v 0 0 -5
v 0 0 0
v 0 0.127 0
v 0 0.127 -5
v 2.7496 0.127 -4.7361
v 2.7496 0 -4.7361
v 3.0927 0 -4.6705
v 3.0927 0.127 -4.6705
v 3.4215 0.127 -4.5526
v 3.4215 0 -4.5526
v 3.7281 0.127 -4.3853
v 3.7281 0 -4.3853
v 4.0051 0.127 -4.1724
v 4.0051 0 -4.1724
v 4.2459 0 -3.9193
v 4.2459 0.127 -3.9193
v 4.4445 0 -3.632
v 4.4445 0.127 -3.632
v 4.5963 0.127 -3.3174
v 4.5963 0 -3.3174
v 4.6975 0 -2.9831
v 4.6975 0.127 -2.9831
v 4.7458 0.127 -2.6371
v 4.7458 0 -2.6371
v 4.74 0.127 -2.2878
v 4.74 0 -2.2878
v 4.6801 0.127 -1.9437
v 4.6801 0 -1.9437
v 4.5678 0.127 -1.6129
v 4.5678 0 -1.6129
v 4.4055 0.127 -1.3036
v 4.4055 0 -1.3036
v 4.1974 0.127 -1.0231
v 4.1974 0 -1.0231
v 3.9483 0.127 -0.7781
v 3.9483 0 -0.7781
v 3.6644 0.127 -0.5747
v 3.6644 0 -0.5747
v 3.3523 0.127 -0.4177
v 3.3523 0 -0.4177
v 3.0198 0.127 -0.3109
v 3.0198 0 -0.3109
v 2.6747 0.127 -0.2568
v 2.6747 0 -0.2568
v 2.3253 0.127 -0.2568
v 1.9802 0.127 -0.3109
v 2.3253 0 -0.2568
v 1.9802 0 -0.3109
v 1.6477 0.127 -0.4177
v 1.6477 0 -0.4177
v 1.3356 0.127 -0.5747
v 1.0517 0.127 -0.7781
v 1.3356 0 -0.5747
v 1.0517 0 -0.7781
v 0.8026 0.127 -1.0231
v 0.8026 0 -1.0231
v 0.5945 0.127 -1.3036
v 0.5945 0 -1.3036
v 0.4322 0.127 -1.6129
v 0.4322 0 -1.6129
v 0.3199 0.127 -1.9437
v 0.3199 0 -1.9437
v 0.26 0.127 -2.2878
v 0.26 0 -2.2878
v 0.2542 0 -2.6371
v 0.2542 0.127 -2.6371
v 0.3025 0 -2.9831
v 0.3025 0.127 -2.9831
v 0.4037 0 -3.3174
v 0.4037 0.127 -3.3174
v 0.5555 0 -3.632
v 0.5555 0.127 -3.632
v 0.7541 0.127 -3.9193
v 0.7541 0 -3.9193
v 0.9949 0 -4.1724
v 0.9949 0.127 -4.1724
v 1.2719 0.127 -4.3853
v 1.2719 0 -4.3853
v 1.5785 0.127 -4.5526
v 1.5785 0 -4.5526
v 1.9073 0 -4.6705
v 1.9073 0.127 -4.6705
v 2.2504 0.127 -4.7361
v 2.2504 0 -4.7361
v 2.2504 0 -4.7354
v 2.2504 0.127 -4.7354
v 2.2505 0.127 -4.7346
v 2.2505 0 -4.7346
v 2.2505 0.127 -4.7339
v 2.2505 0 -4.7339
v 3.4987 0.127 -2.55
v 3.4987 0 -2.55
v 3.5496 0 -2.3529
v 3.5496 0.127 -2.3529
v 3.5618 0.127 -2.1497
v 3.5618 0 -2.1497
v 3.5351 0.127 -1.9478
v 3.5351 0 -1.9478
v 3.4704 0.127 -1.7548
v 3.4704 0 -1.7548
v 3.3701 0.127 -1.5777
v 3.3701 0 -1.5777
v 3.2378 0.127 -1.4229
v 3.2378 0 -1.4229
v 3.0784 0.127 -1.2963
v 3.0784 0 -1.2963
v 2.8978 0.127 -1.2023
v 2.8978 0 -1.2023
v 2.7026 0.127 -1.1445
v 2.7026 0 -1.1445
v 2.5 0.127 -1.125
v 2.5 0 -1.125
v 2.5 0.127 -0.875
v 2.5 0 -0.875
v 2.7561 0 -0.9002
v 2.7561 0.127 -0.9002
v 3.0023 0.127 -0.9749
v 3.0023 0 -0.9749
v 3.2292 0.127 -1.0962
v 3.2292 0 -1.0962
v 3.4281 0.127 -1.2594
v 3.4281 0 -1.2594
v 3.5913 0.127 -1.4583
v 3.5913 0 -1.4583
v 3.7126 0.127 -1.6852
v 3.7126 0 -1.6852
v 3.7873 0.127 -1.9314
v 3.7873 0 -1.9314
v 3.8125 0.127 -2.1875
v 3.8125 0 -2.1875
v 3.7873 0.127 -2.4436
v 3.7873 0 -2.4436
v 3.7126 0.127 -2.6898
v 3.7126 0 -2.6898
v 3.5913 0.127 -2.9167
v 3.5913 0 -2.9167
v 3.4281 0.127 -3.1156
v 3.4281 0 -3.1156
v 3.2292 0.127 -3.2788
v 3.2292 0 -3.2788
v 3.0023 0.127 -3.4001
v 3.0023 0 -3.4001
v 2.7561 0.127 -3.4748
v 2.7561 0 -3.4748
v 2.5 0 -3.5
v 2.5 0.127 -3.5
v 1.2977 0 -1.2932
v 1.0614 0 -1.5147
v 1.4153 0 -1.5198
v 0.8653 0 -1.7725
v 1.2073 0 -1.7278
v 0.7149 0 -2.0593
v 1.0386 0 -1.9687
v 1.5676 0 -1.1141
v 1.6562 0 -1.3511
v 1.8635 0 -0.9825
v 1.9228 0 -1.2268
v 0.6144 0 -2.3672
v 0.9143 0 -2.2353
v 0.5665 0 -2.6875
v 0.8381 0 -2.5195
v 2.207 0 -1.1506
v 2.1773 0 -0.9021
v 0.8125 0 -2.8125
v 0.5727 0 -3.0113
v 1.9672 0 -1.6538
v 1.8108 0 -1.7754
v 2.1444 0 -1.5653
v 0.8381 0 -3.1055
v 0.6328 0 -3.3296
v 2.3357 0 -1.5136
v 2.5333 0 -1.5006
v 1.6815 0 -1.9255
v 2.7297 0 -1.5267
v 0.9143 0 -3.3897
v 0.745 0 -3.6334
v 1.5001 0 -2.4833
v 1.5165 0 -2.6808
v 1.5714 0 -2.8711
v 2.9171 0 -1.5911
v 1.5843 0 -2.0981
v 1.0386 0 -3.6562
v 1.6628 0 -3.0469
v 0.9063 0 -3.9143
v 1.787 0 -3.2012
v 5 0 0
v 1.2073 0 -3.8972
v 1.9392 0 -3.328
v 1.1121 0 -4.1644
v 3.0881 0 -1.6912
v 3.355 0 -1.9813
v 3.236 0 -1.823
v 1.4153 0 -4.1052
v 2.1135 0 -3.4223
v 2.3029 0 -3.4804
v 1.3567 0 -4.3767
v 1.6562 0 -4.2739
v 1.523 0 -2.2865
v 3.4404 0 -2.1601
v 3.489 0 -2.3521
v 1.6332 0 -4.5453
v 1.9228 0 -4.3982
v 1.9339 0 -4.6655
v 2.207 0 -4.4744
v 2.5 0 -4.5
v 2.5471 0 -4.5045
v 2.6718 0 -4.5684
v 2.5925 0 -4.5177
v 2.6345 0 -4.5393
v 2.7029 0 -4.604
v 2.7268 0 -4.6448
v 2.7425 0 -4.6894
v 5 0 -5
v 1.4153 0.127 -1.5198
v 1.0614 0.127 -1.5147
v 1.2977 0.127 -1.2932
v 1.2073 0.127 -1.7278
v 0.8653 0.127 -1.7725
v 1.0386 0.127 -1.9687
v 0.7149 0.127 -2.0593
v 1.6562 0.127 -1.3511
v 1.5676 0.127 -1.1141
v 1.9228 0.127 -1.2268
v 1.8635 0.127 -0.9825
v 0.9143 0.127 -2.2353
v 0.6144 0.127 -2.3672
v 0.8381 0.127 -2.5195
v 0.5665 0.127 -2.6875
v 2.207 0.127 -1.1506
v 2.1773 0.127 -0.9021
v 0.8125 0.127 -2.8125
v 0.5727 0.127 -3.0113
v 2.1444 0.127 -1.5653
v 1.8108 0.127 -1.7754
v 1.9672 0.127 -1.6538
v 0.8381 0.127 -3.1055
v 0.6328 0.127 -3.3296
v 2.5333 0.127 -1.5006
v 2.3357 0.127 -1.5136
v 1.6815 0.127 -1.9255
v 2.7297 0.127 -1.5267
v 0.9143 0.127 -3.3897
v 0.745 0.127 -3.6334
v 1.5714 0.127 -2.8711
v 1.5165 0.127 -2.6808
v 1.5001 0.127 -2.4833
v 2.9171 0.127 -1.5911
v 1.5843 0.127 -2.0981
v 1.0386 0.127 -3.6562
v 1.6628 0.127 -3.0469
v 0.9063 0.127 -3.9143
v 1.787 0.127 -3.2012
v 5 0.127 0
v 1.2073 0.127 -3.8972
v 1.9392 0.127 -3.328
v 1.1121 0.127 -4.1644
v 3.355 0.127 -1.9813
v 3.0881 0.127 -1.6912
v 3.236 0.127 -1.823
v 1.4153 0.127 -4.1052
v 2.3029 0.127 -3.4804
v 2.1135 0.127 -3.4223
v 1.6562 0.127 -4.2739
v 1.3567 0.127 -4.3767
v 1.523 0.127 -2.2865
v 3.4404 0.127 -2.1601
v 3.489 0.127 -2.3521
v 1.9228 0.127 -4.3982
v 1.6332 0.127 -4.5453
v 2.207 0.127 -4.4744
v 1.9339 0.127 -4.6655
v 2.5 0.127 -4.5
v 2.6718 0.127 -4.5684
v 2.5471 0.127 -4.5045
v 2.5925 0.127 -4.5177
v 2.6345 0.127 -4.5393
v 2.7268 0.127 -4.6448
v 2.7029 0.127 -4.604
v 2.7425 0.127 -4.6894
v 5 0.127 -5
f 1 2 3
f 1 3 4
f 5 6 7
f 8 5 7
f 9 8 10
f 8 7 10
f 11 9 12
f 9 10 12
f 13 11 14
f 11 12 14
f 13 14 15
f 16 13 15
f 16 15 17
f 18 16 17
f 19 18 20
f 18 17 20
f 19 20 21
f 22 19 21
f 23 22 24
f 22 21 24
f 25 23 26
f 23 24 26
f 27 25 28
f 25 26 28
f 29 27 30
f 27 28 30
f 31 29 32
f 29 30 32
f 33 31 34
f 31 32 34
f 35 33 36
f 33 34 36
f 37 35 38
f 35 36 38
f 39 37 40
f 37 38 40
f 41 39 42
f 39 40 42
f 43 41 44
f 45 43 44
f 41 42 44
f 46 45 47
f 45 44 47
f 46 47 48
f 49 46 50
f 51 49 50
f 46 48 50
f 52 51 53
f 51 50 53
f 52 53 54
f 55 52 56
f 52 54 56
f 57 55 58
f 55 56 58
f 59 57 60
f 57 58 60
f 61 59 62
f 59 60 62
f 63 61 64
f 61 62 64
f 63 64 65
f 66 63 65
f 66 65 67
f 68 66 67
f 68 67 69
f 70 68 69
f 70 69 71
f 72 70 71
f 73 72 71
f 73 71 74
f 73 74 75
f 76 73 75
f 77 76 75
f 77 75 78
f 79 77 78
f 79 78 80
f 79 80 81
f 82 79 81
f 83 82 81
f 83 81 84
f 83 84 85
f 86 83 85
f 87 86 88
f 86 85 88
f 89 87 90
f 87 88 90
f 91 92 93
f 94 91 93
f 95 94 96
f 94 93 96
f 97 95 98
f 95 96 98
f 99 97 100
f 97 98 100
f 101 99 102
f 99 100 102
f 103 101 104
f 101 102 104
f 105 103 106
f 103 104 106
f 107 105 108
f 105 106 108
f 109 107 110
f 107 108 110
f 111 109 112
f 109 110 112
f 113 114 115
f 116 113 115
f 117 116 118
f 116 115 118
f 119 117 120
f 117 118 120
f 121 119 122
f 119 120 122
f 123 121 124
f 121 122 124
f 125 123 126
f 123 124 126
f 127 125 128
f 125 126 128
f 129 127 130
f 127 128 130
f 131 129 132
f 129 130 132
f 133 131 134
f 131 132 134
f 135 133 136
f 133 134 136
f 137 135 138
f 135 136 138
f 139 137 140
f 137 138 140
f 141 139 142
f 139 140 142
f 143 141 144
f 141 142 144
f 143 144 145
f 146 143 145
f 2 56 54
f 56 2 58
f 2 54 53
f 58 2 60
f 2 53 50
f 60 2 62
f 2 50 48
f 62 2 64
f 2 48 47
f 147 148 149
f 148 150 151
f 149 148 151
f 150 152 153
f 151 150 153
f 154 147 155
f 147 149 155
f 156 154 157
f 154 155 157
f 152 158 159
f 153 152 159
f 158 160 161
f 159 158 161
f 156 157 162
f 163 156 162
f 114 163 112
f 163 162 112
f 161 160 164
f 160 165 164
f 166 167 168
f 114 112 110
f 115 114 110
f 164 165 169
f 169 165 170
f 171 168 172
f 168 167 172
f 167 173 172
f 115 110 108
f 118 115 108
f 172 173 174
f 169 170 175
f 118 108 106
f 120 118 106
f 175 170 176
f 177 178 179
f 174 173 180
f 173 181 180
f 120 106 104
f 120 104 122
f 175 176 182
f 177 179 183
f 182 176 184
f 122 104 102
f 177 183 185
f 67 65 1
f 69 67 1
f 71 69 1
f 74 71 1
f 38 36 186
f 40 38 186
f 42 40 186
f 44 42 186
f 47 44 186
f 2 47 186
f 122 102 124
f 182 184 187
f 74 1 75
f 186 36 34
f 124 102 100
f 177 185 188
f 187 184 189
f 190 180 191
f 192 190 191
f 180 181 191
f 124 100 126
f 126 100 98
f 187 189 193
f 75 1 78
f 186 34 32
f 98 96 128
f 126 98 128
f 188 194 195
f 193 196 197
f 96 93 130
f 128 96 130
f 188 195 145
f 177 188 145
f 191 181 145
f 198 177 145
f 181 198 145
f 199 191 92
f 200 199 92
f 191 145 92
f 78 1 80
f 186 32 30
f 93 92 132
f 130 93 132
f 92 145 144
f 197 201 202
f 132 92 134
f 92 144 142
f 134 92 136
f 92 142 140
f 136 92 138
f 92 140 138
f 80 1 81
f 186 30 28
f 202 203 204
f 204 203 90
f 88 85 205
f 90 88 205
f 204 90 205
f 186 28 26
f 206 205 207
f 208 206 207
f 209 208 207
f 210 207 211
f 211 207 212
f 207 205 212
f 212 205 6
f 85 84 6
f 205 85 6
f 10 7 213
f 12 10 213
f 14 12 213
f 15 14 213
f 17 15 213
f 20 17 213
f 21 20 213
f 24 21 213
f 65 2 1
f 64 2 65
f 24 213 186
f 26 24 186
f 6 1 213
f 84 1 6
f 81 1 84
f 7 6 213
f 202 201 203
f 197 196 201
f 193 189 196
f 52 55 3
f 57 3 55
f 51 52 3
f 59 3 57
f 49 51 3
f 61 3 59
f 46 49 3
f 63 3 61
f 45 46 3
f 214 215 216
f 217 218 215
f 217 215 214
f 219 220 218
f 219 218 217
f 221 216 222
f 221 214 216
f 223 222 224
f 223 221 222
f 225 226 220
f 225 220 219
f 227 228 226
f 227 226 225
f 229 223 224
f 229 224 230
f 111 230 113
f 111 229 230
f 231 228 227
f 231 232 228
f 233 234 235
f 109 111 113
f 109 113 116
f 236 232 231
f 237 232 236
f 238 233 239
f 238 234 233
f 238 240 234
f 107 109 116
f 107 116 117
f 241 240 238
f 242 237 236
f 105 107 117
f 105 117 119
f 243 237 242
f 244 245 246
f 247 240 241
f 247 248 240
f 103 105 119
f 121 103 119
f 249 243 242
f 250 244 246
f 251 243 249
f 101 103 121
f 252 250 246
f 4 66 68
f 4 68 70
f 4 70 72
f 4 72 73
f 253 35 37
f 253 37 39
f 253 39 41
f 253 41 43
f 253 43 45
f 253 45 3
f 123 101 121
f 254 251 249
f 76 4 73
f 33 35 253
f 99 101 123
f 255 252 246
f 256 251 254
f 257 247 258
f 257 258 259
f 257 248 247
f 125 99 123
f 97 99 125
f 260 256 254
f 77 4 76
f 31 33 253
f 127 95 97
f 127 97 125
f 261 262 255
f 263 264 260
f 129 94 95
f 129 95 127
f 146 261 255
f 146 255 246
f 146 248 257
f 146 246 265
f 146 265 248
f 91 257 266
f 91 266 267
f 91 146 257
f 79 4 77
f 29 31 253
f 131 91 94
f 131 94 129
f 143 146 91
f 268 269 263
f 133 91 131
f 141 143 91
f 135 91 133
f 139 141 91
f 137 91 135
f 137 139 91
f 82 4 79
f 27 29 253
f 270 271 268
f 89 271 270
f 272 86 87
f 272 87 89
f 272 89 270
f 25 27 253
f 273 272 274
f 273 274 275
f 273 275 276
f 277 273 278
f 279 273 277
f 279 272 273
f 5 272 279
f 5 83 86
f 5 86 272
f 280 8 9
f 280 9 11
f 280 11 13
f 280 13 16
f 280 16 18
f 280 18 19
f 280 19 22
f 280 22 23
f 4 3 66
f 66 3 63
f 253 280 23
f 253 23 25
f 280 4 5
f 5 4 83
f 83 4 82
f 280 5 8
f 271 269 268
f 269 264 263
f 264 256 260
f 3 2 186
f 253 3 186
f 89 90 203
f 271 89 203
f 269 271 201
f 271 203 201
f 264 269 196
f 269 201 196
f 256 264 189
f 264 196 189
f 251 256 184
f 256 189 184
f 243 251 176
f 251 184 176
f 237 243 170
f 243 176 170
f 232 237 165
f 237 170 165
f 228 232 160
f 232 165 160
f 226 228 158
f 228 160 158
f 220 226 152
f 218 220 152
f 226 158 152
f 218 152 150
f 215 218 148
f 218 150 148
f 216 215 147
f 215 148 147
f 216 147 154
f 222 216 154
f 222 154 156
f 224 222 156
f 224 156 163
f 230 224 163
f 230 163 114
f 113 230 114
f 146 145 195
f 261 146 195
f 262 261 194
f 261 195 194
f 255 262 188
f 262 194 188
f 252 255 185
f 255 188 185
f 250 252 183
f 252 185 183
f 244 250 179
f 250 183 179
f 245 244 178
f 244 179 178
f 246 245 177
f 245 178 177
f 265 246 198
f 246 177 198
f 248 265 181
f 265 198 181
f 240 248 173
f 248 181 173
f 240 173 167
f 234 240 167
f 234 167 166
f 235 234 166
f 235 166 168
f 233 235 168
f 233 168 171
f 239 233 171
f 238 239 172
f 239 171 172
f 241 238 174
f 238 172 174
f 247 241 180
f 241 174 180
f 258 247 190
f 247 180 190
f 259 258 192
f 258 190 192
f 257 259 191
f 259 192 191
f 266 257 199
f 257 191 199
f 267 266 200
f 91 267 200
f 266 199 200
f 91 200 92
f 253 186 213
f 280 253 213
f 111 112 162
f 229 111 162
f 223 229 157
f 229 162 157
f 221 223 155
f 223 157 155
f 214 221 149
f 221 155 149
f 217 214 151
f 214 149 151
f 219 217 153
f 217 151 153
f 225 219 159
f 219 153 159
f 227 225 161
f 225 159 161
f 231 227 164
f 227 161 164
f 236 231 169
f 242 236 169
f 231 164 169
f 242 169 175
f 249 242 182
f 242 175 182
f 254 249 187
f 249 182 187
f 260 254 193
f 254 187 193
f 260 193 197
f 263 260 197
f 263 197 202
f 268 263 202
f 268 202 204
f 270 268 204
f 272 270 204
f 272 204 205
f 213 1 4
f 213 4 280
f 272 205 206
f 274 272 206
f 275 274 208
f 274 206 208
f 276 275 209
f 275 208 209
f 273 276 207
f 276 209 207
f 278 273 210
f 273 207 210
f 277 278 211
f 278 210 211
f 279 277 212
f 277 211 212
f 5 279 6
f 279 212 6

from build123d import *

# Parameters (mm, degrees)
SKETCH1_W           = 5
SKETCH1_H           = 5
BOSS_EXTRUDE1_DEPTH = 0.127


with BuildPart() as part:
    # Sketch1 → Boss-Extrude1 (new body)
    with BuildSketch(Plane(origin=(0, 0, 0), x_dir=(1, 0, 0), z_dir=(0, 1, 0))):
        with Locations((2.5, 2.5)):
            Rectangle(SKETCH1_W, SKETCH1_H)
        with BuildLine():
            ThreePointArc((2.749613899, 4.736111111), (2.5, 0.25), (2.250386101, 4.736111111))
            ThreePointArc((2.250386101, 4.736111111), (2.250450954, 4.734990888), (2.250520834, 4.733870968))
            ThreePointArc((2.250520834, 4.733870968), (0.566536463, 2.6875), (2.5, 0.875))
            ThreePointArc((2.5, 0.875), (3.8125, 2.1875), (2.5, 3.5))
            ThreePointArc((2.5, 3.5), (1.810797562, 1.775431163), (3.498749218, 2.55))
            ThreePointArc((3.498749218, 2.55), (3.370075428, 1.577684454), (2.5, 1.125))
            ThreePointArc((2.5, 1.125), (0.8125, 2.8125), (2.5, 4.5))
            ThreePointArc((2.5, 4.5), (2.671796068, 4.568379211), (2.749613899, 4.736111111))
        make_face(mode=Mode.SUBTRACT)
    extrude(amount=BOSS_EXTRUDE1_DEPTH)


solid = part.part
